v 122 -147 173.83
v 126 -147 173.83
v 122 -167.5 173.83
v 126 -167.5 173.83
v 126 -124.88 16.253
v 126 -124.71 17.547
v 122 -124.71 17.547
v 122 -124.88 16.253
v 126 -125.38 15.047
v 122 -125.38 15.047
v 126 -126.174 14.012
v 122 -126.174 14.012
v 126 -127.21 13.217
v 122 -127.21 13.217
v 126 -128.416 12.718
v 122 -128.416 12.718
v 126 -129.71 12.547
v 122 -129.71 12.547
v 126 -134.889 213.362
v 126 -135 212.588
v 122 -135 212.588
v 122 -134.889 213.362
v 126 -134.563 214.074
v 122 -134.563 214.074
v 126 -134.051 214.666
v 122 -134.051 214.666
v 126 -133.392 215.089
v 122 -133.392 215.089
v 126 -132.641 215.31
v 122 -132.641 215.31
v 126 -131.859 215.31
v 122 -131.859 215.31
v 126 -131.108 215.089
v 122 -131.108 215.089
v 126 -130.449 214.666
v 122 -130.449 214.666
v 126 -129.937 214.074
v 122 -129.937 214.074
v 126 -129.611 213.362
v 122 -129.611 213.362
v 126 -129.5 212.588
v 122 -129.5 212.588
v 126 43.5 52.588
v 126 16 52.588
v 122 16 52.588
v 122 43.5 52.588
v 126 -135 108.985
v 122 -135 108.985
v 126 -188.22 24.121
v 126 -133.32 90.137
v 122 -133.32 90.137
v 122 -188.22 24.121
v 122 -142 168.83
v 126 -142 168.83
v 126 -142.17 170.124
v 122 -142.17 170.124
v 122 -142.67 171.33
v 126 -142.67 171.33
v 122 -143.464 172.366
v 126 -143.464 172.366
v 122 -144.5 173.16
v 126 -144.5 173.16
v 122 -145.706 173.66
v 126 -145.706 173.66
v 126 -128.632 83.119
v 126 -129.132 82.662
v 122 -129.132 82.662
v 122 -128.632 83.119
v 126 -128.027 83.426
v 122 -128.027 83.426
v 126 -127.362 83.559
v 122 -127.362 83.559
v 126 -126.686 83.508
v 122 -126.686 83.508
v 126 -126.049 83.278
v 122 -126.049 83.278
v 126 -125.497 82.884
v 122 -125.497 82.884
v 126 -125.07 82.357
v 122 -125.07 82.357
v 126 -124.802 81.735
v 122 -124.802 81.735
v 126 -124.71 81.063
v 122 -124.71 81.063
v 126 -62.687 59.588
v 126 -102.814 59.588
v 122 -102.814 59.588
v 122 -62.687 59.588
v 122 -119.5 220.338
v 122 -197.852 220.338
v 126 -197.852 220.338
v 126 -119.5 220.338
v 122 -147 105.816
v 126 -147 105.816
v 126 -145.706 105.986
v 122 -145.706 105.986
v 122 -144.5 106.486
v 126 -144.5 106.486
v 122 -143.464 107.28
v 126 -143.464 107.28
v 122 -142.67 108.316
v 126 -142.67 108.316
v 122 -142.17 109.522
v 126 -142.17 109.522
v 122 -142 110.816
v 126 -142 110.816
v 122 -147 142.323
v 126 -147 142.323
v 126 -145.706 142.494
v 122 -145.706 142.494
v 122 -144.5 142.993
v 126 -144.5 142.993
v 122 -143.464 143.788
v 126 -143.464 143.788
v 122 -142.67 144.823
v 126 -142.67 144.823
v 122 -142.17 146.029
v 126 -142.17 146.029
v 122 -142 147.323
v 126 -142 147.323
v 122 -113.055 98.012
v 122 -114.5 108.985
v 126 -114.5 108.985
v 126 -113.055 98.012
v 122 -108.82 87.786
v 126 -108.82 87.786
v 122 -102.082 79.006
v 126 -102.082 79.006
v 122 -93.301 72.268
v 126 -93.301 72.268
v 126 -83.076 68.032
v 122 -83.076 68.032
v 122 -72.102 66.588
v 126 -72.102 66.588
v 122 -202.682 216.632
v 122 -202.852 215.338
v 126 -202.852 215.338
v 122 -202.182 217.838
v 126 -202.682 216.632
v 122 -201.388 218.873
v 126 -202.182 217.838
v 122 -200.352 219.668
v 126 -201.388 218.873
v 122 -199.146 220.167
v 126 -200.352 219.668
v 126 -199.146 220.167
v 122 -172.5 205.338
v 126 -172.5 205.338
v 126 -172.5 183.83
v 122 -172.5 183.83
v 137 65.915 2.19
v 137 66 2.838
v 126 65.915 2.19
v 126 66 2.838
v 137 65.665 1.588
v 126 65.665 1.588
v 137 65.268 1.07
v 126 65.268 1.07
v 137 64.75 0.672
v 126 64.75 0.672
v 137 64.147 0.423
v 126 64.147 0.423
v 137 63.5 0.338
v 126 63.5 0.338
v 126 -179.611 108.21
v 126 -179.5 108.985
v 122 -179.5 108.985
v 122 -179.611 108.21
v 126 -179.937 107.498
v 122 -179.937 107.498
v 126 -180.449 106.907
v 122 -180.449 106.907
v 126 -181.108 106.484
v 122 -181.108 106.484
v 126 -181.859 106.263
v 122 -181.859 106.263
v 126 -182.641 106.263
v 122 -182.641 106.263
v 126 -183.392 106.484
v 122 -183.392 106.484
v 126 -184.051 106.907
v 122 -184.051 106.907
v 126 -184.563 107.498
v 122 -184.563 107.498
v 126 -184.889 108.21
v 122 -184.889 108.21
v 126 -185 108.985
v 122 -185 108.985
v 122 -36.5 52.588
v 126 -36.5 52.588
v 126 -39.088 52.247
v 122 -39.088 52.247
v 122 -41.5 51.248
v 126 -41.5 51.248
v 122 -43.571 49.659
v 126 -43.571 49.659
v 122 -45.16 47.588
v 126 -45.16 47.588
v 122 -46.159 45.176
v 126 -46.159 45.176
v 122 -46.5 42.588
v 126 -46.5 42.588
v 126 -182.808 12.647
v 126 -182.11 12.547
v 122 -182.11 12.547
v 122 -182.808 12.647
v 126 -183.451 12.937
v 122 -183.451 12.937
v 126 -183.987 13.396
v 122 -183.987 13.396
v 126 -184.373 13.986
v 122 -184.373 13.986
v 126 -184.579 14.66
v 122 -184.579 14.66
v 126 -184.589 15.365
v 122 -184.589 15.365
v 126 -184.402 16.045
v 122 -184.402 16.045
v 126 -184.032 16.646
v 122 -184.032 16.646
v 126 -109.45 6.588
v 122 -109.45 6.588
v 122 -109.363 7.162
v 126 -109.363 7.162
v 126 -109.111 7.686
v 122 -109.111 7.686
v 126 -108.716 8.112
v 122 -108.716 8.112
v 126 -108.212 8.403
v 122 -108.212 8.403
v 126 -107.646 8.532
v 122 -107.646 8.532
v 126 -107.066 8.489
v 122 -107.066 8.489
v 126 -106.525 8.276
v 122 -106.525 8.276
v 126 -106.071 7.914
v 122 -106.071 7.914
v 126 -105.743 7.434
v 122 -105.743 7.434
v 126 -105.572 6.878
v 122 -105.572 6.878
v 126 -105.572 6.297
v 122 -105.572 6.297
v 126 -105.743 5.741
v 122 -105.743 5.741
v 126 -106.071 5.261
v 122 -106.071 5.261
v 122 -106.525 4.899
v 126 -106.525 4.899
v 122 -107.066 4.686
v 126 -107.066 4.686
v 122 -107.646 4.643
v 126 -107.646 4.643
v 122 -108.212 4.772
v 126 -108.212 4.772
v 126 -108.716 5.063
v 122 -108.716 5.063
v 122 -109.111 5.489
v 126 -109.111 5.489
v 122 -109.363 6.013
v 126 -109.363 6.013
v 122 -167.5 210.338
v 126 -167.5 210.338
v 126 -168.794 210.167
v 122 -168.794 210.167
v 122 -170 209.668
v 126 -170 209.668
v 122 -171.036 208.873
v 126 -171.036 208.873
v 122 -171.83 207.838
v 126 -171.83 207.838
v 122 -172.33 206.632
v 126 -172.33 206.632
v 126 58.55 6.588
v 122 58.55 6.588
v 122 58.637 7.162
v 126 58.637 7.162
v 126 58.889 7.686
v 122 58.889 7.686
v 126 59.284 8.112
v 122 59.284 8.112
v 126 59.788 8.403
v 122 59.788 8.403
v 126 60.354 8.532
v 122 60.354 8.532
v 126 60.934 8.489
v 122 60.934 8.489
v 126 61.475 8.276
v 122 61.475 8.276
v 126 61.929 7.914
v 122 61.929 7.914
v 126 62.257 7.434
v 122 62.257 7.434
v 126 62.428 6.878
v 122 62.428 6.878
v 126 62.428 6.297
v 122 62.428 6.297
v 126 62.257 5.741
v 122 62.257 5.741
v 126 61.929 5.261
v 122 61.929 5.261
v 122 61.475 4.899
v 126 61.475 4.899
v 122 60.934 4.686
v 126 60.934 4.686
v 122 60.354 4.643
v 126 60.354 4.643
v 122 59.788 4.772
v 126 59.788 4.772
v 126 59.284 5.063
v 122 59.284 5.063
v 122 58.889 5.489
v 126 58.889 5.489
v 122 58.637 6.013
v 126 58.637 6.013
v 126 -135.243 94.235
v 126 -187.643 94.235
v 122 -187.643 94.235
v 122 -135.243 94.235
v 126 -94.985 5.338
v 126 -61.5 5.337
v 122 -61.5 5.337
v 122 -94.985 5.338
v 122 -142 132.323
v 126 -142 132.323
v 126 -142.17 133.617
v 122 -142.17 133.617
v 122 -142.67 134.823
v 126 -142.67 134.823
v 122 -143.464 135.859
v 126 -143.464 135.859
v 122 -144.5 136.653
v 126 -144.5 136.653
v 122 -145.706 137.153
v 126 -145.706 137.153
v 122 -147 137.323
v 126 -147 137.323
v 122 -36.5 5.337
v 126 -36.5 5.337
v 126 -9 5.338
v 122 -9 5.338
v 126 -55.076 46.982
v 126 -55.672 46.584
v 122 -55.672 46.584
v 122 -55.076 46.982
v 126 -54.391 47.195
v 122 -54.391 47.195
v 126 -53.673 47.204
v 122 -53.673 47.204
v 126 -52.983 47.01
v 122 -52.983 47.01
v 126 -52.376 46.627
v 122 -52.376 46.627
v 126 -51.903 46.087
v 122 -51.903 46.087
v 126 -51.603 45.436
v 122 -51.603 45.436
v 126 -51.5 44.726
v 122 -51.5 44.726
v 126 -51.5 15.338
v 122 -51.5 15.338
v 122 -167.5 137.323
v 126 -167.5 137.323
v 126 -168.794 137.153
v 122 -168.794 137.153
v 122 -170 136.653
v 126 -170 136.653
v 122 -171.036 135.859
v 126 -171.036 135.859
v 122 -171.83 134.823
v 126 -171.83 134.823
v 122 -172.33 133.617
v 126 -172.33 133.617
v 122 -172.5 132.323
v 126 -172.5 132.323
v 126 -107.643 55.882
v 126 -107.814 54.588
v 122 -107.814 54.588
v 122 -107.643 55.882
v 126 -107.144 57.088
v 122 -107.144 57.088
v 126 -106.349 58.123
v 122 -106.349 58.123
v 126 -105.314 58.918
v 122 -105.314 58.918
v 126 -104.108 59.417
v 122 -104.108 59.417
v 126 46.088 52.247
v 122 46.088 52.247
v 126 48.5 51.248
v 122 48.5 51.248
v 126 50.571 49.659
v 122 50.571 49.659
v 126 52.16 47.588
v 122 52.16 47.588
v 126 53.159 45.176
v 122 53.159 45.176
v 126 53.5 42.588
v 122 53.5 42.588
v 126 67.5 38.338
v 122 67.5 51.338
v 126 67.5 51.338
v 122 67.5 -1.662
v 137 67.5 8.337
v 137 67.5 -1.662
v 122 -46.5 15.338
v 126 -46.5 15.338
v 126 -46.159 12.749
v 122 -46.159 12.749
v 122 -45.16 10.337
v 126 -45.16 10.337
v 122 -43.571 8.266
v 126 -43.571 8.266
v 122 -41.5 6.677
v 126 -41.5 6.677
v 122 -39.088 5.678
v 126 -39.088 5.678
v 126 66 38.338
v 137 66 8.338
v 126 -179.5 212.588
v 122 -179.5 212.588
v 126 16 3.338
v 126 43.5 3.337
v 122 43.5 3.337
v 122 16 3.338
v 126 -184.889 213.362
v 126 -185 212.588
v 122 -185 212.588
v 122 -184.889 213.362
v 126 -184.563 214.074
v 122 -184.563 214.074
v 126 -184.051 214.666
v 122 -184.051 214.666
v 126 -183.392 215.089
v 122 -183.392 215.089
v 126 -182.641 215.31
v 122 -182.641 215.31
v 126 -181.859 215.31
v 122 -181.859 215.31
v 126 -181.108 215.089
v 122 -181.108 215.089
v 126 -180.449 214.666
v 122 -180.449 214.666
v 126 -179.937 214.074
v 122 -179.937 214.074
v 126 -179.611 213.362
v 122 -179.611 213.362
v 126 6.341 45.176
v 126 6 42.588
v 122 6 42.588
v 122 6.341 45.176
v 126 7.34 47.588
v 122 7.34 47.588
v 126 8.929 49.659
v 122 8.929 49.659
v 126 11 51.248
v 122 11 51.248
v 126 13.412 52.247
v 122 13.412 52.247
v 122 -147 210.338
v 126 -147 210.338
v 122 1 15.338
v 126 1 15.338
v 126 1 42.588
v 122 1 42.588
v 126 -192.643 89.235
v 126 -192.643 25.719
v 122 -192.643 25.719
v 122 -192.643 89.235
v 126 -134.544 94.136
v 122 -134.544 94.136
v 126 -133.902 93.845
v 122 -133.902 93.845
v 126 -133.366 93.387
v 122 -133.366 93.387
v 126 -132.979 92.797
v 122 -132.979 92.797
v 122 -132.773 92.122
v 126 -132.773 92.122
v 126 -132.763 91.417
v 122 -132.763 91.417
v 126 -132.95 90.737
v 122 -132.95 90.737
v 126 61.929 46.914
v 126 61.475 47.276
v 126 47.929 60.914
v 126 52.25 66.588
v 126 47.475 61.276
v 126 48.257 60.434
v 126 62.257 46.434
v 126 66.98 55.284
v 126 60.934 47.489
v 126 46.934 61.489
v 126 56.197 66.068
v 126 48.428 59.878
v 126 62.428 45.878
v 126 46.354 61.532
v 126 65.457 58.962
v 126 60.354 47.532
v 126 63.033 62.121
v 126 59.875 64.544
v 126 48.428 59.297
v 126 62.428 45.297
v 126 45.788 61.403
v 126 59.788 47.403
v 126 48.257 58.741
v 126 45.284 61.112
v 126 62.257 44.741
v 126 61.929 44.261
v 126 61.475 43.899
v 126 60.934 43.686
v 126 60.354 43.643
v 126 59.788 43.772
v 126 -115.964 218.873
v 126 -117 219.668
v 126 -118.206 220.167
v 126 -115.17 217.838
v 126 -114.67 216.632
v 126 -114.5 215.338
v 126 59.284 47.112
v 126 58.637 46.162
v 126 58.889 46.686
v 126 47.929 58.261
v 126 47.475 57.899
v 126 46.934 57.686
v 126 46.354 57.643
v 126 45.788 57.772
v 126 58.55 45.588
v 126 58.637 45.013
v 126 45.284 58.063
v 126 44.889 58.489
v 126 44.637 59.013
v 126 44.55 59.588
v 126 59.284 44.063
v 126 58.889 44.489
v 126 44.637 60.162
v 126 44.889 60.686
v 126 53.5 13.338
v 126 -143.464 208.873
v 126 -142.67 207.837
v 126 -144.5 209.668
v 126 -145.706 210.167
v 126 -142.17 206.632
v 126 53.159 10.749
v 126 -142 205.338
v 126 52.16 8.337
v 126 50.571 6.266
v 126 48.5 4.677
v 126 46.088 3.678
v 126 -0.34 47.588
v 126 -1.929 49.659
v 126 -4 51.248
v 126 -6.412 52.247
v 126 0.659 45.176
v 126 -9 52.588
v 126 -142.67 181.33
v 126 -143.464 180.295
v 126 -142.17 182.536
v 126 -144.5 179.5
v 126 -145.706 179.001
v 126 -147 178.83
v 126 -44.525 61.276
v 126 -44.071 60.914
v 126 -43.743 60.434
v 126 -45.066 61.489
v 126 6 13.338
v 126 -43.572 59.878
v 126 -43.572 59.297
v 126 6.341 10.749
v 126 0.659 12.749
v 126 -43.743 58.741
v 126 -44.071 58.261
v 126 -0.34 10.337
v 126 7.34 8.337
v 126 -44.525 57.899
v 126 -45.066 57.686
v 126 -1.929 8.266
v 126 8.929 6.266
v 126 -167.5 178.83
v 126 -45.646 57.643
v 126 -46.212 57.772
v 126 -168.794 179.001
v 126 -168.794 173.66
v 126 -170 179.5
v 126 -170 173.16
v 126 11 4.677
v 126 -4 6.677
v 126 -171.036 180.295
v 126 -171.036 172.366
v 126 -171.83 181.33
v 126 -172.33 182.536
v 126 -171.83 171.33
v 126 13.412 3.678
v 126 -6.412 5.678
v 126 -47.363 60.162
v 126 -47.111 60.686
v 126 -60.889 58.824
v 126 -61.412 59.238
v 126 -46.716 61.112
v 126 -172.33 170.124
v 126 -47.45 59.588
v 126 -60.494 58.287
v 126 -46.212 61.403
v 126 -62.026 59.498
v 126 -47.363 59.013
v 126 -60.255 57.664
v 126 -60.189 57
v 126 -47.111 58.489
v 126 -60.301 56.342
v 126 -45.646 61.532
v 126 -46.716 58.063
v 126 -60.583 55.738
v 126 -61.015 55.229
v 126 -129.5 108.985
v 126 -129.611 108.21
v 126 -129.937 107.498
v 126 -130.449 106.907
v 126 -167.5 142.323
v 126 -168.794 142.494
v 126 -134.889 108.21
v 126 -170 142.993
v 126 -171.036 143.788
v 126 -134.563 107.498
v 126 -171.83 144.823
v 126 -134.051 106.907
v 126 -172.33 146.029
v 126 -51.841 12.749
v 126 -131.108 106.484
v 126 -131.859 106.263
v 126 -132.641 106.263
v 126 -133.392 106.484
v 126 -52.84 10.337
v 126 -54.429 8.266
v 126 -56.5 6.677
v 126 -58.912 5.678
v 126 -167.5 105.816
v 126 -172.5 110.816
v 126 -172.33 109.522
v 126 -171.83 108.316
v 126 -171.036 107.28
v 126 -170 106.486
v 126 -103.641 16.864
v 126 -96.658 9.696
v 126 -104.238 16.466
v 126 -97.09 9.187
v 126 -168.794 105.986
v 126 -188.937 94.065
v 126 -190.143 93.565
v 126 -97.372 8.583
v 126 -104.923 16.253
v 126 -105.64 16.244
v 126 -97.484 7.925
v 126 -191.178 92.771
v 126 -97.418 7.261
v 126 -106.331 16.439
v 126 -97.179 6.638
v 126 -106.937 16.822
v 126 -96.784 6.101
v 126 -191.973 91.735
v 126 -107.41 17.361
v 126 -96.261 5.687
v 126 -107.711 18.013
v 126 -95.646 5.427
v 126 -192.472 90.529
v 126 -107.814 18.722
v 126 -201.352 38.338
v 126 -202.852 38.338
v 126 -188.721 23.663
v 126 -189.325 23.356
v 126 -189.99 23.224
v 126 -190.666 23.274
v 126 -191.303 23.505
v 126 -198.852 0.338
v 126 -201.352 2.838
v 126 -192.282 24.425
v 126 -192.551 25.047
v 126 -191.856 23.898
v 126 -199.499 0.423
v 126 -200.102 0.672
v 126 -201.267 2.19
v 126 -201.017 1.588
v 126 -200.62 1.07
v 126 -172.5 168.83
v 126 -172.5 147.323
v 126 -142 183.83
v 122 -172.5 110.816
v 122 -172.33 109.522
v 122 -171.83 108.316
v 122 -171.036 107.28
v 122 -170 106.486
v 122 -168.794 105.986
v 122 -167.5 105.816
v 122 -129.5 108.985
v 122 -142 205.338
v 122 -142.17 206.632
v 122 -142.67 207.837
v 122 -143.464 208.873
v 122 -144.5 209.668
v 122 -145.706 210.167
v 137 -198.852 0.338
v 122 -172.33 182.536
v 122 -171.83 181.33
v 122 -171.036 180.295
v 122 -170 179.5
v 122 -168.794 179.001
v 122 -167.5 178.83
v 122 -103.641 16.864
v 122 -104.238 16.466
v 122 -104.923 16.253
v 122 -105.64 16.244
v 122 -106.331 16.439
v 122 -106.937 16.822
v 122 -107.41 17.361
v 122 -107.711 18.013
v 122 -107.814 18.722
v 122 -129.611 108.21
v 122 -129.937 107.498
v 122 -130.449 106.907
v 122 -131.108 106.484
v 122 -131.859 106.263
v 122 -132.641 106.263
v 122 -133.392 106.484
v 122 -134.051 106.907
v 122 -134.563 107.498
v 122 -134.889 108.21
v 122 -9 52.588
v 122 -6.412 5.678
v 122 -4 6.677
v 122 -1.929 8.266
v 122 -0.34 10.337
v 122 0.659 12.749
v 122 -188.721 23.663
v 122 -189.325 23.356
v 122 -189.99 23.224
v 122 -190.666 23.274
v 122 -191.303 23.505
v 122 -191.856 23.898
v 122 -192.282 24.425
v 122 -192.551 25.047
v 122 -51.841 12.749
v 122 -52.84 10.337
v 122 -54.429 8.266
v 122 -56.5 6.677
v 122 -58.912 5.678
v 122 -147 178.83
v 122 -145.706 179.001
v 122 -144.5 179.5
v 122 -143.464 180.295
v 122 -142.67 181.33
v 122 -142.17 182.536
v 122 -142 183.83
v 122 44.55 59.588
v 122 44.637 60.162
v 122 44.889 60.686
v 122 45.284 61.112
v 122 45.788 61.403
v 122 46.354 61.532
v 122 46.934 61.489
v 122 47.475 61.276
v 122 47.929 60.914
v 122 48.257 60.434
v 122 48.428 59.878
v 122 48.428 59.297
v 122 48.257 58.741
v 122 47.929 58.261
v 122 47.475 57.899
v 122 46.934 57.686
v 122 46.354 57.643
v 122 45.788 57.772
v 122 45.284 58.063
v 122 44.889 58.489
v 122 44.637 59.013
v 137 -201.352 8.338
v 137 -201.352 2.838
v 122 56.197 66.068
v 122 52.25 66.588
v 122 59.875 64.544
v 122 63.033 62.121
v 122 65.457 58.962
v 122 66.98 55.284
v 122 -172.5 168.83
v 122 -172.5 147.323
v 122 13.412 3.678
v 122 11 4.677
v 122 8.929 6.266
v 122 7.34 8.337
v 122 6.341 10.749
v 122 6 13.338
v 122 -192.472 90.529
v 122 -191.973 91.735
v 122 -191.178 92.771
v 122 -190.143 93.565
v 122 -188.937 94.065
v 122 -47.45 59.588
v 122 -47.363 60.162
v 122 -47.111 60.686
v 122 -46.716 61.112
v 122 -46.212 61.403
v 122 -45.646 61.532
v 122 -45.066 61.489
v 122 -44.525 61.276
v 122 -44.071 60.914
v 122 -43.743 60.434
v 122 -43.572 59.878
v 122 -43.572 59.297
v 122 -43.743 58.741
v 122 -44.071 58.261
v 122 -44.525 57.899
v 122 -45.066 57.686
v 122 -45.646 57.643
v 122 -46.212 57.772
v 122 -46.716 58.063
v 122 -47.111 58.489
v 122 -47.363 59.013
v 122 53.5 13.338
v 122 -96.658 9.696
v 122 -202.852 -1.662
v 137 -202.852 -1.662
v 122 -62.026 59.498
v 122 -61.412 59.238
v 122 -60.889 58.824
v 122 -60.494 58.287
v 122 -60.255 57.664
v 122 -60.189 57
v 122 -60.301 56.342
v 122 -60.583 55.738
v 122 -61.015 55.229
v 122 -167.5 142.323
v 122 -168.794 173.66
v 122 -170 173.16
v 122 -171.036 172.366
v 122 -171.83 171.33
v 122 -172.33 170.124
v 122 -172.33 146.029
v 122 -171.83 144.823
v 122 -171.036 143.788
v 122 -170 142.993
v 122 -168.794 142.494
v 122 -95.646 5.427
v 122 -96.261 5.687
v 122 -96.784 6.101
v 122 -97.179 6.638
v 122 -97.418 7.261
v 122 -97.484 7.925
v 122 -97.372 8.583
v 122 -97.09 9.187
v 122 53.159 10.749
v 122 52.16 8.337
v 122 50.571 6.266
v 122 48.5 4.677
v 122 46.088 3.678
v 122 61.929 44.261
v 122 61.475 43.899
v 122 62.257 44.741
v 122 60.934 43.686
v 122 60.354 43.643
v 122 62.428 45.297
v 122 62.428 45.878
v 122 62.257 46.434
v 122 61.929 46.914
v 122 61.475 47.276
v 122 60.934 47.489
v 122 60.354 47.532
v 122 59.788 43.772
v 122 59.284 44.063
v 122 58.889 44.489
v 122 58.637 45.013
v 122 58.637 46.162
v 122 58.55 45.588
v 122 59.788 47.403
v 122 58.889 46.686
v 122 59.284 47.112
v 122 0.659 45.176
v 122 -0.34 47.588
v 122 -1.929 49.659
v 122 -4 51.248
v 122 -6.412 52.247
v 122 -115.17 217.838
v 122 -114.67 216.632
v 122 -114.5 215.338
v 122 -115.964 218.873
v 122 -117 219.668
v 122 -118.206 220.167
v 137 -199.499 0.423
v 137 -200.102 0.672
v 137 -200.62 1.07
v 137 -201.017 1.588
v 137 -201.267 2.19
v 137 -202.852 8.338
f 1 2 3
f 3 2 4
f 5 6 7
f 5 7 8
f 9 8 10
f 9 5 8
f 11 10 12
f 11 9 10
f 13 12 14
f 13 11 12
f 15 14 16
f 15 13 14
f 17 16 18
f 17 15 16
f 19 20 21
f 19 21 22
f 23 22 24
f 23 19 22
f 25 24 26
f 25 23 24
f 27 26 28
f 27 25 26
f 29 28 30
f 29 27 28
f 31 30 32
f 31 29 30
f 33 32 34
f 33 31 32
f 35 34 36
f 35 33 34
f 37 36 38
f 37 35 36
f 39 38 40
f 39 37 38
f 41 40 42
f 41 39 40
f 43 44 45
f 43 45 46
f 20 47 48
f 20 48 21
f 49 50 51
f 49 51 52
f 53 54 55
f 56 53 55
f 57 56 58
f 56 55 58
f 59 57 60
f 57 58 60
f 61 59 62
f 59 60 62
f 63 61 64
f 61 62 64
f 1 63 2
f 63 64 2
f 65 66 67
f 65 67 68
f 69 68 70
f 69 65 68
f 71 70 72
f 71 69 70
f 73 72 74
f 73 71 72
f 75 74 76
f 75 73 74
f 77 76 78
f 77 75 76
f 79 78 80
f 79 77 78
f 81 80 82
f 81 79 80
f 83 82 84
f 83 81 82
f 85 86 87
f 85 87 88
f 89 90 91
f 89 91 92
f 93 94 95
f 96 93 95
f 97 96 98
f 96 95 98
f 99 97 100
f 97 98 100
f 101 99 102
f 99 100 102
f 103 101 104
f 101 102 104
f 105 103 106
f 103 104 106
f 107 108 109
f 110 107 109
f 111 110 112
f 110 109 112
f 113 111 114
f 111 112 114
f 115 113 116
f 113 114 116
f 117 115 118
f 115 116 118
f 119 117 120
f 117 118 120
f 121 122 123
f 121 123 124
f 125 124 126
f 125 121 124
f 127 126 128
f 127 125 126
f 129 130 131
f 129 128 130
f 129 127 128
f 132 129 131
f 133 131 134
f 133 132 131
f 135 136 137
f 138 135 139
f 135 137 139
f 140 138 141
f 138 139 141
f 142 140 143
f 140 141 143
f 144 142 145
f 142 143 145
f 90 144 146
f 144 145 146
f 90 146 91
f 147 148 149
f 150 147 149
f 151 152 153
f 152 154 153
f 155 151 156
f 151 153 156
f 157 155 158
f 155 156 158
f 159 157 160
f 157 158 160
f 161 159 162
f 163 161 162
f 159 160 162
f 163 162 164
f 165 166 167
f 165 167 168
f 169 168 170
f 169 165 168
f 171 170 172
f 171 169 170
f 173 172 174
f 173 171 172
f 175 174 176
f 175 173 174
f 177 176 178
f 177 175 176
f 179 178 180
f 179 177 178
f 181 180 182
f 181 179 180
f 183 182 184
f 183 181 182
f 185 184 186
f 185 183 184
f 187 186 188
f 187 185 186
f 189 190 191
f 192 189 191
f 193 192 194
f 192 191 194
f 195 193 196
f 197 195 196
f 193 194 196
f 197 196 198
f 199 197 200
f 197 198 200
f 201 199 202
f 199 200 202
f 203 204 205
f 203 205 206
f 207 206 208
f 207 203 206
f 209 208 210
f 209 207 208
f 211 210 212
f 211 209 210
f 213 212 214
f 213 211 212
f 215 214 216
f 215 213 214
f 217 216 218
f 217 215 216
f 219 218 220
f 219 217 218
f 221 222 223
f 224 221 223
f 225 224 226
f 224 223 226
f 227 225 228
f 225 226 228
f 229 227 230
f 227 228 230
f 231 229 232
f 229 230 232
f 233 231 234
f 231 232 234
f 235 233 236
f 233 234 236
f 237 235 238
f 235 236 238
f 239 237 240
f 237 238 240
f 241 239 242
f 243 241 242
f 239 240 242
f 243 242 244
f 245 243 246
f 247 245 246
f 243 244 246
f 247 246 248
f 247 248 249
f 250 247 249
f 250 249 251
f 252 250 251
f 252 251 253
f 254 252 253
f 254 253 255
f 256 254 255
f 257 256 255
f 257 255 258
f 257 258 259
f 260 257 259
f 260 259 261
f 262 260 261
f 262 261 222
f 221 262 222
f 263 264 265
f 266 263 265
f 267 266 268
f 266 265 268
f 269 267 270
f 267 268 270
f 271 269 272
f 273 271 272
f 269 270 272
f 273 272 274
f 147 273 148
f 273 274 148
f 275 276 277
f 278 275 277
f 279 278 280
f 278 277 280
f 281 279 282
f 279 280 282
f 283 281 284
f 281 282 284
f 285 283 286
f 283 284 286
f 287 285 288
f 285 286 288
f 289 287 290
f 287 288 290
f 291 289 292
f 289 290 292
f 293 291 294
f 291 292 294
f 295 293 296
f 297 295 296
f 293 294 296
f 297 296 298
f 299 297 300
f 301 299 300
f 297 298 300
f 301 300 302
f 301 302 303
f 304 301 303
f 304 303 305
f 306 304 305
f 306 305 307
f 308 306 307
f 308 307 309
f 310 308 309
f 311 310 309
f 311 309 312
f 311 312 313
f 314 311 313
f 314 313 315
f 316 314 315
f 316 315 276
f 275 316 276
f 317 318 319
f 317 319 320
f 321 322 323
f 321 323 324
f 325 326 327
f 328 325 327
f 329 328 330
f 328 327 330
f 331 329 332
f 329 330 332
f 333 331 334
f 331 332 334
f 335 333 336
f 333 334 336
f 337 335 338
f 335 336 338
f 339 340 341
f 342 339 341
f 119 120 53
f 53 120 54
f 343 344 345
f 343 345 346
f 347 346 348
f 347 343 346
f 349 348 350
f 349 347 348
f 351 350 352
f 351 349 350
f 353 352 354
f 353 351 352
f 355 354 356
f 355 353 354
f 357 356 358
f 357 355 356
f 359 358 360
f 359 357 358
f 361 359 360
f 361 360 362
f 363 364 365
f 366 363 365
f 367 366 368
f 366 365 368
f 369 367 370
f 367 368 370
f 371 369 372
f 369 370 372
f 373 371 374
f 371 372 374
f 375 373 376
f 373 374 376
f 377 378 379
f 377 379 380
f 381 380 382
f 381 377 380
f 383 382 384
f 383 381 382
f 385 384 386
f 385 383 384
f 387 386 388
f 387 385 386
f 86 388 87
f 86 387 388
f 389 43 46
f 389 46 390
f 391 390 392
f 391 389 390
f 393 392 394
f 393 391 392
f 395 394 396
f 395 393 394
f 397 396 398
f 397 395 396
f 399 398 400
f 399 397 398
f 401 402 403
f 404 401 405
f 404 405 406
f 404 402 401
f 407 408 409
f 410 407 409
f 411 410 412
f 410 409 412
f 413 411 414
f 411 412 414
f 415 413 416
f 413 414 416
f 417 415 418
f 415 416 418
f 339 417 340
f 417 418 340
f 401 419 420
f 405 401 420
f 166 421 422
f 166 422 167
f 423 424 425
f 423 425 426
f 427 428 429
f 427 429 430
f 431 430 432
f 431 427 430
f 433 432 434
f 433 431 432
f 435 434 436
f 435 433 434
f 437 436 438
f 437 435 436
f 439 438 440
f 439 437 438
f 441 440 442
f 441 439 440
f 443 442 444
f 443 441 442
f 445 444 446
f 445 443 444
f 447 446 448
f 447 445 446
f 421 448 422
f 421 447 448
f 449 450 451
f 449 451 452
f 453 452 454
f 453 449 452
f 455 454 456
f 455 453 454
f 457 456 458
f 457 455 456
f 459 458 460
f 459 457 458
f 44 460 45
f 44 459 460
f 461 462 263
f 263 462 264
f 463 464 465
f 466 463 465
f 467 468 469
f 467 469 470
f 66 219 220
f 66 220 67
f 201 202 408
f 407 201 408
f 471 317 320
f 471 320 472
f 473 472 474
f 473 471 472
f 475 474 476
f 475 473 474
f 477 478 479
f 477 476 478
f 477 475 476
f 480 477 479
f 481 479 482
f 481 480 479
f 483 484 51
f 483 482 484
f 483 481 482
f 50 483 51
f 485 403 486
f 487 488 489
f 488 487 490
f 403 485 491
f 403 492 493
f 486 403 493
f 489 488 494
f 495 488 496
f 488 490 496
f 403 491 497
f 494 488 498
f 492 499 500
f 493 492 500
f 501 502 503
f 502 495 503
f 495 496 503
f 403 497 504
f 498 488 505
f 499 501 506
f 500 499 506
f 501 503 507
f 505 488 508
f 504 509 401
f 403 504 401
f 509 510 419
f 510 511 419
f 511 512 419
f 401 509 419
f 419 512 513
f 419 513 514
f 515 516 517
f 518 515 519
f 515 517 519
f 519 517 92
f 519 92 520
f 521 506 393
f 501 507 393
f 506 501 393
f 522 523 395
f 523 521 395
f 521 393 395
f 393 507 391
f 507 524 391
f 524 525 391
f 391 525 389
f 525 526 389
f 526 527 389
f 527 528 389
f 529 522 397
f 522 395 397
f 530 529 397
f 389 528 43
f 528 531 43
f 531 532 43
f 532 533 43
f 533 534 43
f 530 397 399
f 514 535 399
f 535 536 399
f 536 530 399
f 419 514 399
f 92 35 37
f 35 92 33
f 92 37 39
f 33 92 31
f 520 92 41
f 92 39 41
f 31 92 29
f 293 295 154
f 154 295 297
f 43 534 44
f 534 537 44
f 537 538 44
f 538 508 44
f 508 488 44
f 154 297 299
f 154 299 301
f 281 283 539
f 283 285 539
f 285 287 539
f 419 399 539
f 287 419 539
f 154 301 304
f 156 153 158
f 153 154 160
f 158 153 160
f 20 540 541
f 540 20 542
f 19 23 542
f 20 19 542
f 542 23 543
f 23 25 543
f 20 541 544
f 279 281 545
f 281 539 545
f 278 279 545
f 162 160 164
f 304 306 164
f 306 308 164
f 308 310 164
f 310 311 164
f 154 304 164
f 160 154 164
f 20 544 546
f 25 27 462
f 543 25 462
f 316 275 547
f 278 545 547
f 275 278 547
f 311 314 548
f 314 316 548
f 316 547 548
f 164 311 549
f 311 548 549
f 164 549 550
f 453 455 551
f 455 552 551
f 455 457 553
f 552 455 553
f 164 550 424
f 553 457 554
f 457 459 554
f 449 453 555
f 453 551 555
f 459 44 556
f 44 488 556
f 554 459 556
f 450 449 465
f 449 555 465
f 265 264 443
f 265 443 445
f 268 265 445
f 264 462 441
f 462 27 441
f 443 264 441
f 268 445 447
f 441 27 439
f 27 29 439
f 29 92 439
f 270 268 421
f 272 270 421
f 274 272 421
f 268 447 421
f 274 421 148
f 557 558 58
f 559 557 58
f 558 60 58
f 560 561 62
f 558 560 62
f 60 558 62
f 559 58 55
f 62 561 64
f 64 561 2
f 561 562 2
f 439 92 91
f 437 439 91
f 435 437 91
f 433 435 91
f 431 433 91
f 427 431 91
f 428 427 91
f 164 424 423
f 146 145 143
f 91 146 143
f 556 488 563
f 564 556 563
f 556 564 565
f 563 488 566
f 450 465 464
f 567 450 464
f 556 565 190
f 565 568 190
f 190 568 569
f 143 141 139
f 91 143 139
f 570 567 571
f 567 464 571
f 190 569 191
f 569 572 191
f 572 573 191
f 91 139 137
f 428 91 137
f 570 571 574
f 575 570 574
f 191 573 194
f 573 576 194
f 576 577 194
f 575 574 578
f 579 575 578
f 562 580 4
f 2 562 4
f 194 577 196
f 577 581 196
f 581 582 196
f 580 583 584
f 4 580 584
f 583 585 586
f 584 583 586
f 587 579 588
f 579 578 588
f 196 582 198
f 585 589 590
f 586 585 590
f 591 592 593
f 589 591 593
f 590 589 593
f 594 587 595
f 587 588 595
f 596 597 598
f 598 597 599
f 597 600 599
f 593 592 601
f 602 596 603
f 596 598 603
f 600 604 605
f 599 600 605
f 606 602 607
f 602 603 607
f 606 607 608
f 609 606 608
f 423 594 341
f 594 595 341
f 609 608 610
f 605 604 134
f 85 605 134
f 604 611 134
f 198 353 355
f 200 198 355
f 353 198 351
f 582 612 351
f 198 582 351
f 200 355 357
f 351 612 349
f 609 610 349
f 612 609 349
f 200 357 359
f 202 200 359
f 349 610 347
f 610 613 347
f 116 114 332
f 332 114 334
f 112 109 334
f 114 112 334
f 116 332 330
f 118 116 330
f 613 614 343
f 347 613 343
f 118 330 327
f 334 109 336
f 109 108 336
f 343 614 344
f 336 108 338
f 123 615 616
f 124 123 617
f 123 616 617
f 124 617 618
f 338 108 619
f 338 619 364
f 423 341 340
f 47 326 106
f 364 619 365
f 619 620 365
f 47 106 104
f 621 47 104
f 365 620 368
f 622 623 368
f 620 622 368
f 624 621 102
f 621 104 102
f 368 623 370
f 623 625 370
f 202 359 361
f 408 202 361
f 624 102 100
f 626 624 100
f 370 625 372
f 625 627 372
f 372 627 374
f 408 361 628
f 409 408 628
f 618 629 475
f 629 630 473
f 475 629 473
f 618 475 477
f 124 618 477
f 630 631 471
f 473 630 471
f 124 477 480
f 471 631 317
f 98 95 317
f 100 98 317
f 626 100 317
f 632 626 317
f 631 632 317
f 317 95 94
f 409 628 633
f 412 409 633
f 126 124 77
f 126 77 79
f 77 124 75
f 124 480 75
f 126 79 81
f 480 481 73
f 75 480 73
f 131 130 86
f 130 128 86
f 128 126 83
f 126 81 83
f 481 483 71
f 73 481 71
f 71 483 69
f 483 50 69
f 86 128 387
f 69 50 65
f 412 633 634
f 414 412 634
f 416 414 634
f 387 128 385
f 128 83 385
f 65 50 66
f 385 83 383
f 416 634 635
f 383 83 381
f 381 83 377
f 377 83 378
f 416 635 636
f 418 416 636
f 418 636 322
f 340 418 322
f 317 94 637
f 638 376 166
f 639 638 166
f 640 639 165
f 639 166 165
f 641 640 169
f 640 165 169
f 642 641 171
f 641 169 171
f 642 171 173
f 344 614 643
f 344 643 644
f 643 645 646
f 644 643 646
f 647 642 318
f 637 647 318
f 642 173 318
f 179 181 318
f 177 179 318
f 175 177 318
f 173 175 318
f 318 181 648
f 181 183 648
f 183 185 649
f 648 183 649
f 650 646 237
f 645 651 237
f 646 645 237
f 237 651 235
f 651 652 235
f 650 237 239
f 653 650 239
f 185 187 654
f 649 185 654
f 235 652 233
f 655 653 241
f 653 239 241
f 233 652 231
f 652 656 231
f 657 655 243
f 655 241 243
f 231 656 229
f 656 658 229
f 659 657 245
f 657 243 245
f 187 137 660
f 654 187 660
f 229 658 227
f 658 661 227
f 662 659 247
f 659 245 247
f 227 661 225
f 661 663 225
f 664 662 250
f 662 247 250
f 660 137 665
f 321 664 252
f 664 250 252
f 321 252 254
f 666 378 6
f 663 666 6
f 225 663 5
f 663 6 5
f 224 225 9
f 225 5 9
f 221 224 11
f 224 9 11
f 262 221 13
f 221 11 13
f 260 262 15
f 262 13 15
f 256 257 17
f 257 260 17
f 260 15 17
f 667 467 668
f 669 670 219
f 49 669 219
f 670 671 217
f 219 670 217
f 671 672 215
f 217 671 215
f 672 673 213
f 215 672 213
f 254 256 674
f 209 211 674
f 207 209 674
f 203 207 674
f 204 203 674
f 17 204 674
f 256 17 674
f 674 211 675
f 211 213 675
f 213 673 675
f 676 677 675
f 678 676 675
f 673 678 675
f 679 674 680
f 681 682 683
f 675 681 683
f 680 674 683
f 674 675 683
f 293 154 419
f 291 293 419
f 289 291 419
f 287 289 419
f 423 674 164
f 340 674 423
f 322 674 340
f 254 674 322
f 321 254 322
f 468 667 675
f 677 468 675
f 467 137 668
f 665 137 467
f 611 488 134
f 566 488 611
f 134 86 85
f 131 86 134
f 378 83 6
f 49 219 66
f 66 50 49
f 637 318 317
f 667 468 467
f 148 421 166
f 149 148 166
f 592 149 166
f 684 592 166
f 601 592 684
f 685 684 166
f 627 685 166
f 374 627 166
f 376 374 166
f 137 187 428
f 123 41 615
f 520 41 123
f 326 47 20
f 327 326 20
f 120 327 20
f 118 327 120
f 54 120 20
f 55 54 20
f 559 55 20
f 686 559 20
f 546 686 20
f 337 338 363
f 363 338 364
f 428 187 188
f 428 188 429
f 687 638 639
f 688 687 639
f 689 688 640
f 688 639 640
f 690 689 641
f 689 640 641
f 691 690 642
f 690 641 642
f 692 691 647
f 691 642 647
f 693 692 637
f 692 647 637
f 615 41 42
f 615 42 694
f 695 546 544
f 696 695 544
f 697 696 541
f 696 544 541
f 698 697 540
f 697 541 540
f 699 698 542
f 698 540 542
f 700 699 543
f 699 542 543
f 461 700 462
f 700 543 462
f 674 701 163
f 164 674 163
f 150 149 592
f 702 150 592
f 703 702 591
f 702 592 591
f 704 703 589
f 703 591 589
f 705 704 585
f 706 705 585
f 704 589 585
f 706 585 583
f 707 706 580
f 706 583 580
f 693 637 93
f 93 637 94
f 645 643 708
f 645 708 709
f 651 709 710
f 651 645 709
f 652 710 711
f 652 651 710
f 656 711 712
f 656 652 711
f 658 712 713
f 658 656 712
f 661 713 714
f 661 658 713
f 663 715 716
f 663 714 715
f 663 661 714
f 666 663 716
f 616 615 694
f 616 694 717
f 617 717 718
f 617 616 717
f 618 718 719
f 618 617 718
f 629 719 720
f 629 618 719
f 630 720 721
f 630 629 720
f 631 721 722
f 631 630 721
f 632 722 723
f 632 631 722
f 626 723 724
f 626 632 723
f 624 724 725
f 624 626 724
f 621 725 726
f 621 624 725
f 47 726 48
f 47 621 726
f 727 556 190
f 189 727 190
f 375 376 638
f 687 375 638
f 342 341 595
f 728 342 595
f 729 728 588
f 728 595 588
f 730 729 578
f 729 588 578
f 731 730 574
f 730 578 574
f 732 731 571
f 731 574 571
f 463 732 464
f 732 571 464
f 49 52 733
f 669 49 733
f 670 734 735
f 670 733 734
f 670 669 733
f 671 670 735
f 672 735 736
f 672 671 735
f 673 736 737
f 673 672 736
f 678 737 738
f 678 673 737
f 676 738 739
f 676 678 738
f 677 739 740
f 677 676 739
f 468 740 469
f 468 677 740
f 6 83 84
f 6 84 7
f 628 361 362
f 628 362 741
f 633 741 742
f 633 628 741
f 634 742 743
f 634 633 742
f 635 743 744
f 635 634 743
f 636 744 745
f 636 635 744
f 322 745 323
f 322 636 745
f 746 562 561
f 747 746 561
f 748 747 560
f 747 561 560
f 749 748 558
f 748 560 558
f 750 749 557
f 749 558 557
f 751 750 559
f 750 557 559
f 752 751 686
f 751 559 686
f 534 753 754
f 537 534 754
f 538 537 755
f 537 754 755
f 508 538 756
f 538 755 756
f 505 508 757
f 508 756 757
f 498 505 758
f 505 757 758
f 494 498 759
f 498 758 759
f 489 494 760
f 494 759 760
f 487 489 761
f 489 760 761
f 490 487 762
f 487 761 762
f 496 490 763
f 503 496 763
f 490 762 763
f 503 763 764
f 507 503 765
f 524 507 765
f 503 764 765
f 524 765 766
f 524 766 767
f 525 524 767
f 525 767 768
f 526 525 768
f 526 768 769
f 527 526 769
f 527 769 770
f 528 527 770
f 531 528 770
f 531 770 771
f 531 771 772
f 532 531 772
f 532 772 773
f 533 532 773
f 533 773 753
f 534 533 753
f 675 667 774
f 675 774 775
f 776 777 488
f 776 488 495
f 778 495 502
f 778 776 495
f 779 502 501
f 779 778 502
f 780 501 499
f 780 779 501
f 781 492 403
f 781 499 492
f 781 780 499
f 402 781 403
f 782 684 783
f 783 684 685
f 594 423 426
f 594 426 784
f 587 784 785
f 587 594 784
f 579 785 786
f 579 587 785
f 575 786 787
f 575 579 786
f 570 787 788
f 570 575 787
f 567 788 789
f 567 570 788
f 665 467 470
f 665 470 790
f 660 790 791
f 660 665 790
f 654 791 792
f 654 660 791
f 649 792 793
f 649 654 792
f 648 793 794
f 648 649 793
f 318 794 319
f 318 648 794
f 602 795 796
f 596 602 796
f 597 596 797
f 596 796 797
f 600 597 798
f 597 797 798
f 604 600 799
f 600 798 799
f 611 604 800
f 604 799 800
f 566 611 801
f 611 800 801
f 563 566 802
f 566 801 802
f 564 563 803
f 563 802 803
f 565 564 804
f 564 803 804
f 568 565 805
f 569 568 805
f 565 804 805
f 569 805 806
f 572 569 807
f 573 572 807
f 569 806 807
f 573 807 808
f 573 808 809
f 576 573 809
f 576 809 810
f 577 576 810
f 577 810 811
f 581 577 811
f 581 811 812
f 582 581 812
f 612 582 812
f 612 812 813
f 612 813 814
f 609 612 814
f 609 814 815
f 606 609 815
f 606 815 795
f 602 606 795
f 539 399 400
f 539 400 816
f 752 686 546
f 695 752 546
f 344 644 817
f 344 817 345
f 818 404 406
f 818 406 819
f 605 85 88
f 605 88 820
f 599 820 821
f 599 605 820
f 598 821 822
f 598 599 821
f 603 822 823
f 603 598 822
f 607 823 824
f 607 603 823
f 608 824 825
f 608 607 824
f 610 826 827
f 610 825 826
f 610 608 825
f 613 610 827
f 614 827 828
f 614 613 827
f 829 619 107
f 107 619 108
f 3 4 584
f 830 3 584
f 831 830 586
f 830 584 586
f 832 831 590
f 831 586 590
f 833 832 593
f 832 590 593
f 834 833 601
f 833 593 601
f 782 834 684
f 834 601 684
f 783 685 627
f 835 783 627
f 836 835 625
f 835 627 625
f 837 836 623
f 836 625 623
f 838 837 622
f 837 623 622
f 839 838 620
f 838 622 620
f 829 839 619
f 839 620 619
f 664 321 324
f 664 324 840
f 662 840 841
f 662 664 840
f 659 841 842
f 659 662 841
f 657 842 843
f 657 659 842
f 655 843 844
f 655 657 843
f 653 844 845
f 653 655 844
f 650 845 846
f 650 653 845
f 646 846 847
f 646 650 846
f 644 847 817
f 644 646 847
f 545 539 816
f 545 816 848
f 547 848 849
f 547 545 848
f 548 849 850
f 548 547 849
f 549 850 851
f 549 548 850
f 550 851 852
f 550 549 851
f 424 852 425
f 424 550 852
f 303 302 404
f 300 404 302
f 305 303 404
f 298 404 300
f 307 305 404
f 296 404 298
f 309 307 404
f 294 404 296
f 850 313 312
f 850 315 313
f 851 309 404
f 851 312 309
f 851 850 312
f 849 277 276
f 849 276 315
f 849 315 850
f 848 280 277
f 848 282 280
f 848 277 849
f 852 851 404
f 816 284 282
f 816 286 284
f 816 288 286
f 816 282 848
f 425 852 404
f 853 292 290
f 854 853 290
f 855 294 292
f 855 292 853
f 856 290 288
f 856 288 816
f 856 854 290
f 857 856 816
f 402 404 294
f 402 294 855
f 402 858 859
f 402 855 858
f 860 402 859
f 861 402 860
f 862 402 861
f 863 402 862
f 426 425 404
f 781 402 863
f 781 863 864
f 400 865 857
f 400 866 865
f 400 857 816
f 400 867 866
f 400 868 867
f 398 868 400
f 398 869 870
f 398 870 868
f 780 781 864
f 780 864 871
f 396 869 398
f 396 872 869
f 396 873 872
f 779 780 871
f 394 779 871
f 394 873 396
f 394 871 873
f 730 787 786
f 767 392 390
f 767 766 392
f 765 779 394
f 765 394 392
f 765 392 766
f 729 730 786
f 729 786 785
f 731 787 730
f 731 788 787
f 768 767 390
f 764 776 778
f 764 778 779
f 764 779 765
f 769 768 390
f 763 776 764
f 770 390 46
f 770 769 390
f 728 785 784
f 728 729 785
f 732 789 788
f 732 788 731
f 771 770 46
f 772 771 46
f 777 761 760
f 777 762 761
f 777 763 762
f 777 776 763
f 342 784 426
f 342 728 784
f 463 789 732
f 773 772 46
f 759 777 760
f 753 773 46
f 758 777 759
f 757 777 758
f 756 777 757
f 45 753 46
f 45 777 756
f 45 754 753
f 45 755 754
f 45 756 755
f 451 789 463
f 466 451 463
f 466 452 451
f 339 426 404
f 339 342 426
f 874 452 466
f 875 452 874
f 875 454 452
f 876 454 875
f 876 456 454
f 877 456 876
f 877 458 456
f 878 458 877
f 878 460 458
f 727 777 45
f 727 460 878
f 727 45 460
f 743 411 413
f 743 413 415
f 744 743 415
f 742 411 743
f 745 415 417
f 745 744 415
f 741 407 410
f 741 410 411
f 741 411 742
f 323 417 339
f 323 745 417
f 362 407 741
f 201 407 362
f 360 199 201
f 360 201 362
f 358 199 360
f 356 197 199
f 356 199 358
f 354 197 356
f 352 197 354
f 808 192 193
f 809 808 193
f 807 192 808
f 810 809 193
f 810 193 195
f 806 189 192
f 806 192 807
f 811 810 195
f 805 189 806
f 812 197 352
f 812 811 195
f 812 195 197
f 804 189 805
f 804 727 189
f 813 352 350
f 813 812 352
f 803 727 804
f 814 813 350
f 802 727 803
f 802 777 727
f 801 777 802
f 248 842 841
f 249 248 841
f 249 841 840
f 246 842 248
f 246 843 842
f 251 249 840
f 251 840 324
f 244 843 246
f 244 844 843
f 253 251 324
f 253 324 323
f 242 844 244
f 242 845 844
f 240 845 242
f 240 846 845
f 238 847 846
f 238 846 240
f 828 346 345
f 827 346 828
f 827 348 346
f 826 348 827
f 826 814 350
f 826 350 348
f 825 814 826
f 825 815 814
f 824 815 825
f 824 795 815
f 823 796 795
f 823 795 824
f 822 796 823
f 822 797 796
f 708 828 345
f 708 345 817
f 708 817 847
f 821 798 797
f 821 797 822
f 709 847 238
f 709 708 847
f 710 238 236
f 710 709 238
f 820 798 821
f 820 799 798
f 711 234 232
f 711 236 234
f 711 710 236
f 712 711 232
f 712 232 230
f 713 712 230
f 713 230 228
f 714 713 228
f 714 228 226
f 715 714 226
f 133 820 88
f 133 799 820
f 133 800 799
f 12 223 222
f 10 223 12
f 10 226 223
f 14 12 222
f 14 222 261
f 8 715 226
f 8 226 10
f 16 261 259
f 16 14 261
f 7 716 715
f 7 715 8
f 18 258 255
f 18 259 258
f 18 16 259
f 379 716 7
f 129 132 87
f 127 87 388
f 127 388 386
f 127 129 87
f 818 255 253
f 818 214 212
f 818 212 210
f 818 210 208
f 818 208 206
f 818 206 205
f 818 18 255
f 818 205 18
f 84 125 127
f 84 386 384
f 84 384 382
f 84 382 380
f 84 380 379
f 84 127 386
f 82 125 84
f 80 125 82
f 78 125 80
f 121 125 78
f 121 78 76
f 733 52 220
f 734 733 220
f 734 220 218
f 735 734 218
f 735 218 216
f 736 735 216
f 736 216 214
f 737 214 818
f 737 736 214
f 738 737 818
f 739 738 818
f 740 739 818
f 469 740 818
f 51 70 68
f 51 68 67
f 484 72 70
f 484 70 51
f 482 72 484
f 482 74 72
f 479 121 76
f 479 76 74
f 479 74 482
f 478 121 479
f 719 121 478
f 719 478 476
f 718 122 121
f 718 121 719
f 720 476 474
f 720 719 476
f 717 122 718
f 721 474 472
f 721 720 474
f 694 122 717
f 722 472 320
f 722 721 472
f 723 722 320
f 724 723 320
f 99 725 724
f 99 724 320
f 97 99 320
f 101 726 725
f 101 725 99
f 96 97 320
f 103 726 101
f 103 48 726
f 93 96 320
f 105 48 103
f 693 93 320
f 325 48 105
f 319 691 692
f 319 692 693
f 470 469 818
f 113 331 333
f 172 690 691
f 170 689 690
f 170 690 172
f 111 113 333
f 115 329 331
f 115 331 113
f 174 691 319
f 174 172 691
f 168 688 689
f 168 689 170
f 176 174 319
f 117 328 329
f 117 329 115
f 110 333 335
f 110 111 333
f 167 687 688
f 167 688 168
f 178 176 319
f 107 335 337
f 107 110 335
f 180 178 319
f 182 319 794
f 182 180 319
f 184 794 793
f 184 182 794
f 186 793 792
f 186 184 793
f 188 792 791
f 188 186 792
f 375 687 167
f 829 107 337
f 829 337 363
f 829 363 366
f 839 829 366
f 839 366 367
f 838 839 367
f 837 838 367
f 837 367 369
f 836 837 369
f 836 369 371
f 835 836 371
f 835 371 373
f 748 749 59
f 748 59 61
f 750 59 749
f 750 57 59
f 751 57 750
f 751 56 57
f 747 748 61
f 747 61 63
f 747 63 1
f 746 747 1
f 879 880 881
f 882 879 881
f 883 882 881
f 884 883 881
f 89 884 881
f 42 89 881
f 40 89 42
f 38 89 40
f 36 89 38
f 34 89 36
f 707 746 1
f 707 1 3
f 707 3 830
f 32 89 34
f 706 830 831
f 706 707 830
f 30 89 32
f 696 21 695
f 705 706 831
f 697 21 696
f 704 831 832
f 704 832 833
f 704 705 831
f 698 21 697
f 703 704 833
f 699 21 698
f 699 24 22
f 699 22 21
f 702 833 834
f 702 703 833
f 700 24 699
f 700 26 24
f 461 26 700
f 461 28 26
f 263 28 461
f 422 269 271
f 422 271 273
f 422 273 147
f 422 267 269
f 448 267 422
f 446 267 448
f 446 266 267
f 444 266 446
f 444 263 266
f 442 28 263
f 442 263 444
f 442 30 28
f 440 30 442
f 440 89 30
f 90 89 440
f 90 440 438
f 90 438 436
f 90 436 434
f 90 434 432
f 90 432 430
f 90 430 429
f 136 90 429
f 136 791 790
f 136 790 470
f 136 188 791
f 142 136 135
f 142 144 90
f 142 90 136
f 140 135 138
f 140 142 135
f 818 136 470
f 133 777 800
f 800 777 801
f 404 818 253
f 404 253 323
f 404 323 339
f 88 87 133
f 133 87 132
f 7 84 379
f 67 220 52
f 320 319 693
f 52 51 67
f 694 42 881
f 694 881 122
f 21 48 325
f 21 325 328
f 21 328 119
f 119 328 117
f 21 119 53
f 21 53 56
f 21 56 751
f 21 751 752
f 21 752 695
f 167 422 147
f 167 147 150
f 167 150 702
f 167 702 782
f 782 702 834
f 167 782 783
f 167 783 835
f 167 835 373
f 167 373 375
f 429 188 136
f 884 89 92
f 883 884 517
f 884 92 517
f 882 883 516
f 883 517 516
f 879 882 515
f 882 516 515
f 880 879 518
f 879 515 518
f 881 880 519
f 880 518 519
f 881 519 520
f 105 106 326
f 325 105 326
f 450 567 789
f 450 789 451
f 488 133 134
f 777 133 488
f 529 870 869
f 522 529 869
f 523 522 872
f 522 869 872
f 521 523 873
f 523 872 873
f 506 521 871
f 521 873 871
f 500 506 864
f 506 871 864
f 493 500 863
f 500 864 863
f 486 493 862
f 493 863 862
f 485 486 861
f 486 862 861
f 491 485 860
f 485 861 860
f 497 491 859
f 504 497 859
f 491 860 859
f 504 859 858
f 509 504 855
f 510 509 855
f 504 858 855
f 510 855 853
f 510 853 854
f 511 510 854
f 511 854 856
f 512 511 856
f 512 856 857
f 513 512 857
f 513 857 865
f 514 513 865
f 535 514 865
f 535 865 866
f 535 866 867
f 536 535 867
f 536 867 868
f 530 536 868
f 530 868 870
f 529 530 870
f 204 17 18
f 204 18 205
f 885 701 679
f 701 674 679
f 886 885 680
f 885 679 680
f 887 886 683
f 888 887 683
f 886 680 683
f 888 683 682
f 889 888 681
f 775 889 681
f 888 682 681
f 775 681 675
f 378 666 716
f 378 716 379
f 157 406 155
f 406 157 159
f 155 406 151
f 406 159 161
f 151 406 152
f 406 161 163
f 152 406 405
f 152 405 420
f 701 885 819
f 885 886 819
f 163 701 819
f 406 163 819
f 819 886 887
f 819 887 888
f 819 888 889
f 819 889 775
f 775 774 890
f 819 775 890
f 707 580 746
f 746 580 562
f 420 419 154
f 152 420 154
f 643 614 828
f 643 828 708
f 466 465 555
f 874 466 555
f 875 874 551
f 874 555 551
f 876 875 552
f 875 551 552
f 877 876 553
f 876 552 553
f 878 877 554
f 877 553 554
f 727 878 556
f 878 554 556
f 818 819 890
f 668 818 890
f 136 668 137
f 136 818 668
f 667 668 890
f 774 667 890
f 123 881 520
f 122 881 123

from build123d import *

# Parameters (mm, degrees)
SKETCH1_R           = 1.95
BOSS_EXTRUDE1_DEPTH = 15
CUT_EXTRUDE2_DEPTH  = 16
CUT_EXTRUDE3_DEPTH  = 16
CUT_EXTRUDE4_DEPTH  = 16
CUT_EXTRUDE5_DEPTH  = 16
FILLET1_R           = 5
SKETCH7_W           = 220
SKETCH7_H           = 267.35226683
CUT_EXTRUDE6_DEPTH  = 11
CUT_EXTRUDE7_DEPTH  = 271.35226683
FILLET2_R           = 2.5


with BuildPart() as part:
    # Sketch1 → Boss-Extrude1 (new body)
    with BuildSketch(Plane(origin=(122, 0, 0), x_dir=(0, -1, 0), z_dir=(-1, 0, 0))):
        with BuildLine():
            Line((-67.5, -1.6625), (202.85226683, -1.6625))
            Line((202.85226683, -1.6625), (202.85226683, 220.3375))
            Line((202.85226683, 220.3375), (114.499999998, 220.3375))
            Line((114.499999998, 220.3375), (114.499999998, 108.985233168))
            ThreePointArc((114.499999998, 108.985233168), (102.08199146, 79.005508538), (72.10226683, 66.5875))
            Line((72.10226683, 66.5875), (-52.25, 66.5875))
            ThreePointArc((-52.25, 66.5875), (-63.033378413, 62.120878413), (-67.5, 51.3375))
            Line((-67.5, 51.3375), (-67.5, -1.6625))
        make_face()
        with Locations((-60.5, 6.5875)):
            Circle(SKETCH1_R, mode=Mode.SUBTRACT)
        with Locations((107.5, 6.5875)):
            Circle(SKETCH1_R, mode=Mode.SUBTRACT)
        with Locations((-60.5, 45.5875)):
            Circle(SKETCH1_R, mode=Mode.SUBTRACT)
        with Locations((-46.5, 59.5875)):
            Circle(SKETCH1_R, mode=Mode.SUBTRACT)
        with Locations((45.5, 59.5875)):
            Circle(SKETCH1_R, mode=Mode.SUBTRACT)
        Polygon((42.95, 15.7375), (42.95, 13.2375), (40.95, 11.3375), (33.95, 11.3375), (31.95, 13.2375), (31.95, 15.7375), align=None, mode=Mode.SUBTRACT)
        with BuildLine():
            Line((30.95, 11.3375), (17.5, 11.3375))
            Line((17.5, 11.3375), (17.5, 13.9375))
            ThreePointArc((17.5, 13.9375), (24.225, 16.3375), (30.95, 13.9375))
            Line((30.95, 13.9375), (30.95, 11.3375))
        make_face(mode=Mode.SUBTRACT)
    extrude(amount=-BOSS_EXTRUDE1_DEPTH)

    # Sketch2 → Cut-Extrude2 (cut, through all)
    with BuildSketch(Plane(origin=(137, 0, 0), x_dir=(0, 0, -1), z_dir=(1, 0, 0))):
        with BuildLine():
            Line((-42.5875, 53.5), (-13.3375, 53.5))
            ThreePointArc((-13.3375, 53.5), (-6.266432188, 50.571067812), (-3.3375, 43.5))
            Line((-3.3375, 43.5), (-3.3375, 16))
            ThreePointArc((-3.3375, 16), (-6.266432188, 8.928932188), (-13.3375, 6))
            Line((-13.3375, 6), (-42.5875, 6))
            ThreePointArc((-42.5875, 6), (-49.658567812, 8.928932188), (-52.5875, 16))
            Line((-52.5875, 16), (-52.5875, 43.5))
            ThreePointArc((-52.5875, 43.5), (-49.658567812, 50.571067812), (-42.5875, 53.5))
        make_face()
        with BuildLine():
            Line((-42.5875, -46.5), (-15.3375, -46.5))
            ThreePointArc((-15.3375, -46.5), (-8.266432188, -43.571067812), (-5.3375, -36.5))
            Line((-5.3375, -36.5), (-5.3375, -9))
            ThreePointArc((-5.3375, -9), (-8.266432188, -1.928932188), (-15.3375, 1))
            Line((-15.3375, 1), (-42.5875, 1))
            ThreePointArc((-42.5875, 1), (-49.658567812, -1.928932188), (-52.5875, -9))
            Line((-52.5875, -9), (-52.5875, -36.5))
            ThreePointArc((-52.5875, -36.5), (-49.658567812, -43.571067812), (-42.5875, -46.5))
        make_face()
        with BuildLine():
            Line((-55.22929809, -61.015037849), (-16.864289826, -103.641109909))
            ThreePointArc((-16.864289826, -103.641109909), (-16.438731405, -106.33063253), (-18.722491736, -107.81355891))
            Line((-18.722491736, -107.81355891), (-54.5875, -107.81355891))
            ThreePointArc((-54.5875, -107.81355891), (-58.123033906, -106.349092816), (-59.5875, -102.81355891))
            Line((-59.5875, -102.81355891), (-59.5875, -62.68748685))
            ThreePointArc((-59.5875, -62.68748685), (-57.983182763, -60.353444779), (-55.22929809, -61.015037849))
        make_face()
        with BuildLine():
            Line((-44.725753318, -51.5), (-15.3375, -51.5))
            ThreePointArc((-15.3375, -51.5), (-8.266432188, -54.428932188), (-5.3375, -61.5))
            Line((-5.3375, -61.5), (-5.3375, -94.985299242))
            ThreePointArc((-5.3375, -94.985299242), (-6.941817237, -97.319341313), (-9.69570191, -96.657748243))
            Line((-9.69570191, -96.657748243), (-46.583955228, -55.672449001))
            ThreePointArc((-46.583955228, -55.672449001), (-47.00951365, -52.98292638), (-44.725753318, -51.5))
        make_face()
    extrude(amount=-CUT_EXTRUDE2_DEPTH, mode=Mode.SUBTRACT)

    # Sketch3 → Cut-Extrude3 (cut, through all)
    with BuildSketch(Plane(origin=(137, 0, 0), x_dir=(0, 0, -1), z_dir=(1, 0, 0))):
        with BuildLine():
            Line((-212.5875, -129.499999998), (-108.985233168, -129.499999998))
            ThreePointArc((-108.985233168, -129.499999998), (-106.235233168, -132.249999998), (-108.985233168, -134.999999998))
            Line((-108.985233168, -134.999999998), (-212.5875, -134.999999998))
            ThreePointArc((-212.5875, -134.999999998), (-215.3375, -132.249999998), (-212.5875, -129.499999998))
        make_face()
        with BuildLine():
            Line((-212.5875, -179.499999998), (-108.985233168, -179.499999998))
            ThreePointArc((-108.985233168, -179.499999998), (-106.235233168, -182.249999998), (-108.985233168, -184.999999998))
            Line((-108.985233168, -184.999999998), (-212.5875, -184.999999998))
            ThreePointArc((-212.5875, -184.999999998), (-215.3375, -182.249999998), (-212.5875, -179.499999998))
        make_face()
    extrude(amount=-CUT_EXTRUDE3_DEPTH, mode=Mode.SUBTRACT)

    # Sketch4 → Cut-Extrude4 (cut, through all)
    with BuildSketch(Plane(origin=(137, 0, 0), x_dir=(0, 0, -1), z_dir=(1, 0, 0))):
        with BuildLine():
            Line((-94.235233168, -187.642635713), (-94.235233168, -135.242622679))
            ThreePointArc((-94.235233168, -135.242622679), (-92.796770819, -132.97918772), (-90.136722915, -133.320445536))
            Line((-90.136722915, -133.320445536), (-24.120536911, -188.22045857))
            ThreePointArc((-24.120536911, -188.22045857), (-23.367936485, -190.992505451), (-25.719047164, -192.642635713))
            Line((-25.719047164, -192.642635713), (-89.235233168, -192.642635713))
            ThreePointArc((-89.235233168, -192.642635713), (-92.770767074, -191.178169619), (-94.235233168, -187.642635713))
        make_face()
        with BuildLine():
            Line((-12.547131117, -129.709631116), (-12.547131117, -182.109644149))
            ThreePointArc((-12.547131117, -182.109644149), (-13.985593467, -184.373079109), (-16.64564137, -184.031821292))
            Line((-16.64564137, -184.031821292), (-82.661827375, -129.131808259))
            ThreePointArc((-82.661827375, -129.131808259), (-83.414427801, -126.359761378), (-81.063317121, -124.709631116))
            Line((-81.063317121, -124.709631116), (-17.547131117, -124.709631116))
            ThreePointArc((-17.547131117, -124.709631116), (-14.011597211, -126.17409721), (-12.547131117, -129.709631116))
        make_face()
    extrude(amount=-CUT_EXTRUDE4_DEPTH, mode=Mode.SUBTRACT)

    # Sketch5 → Cut-Extrude5 (cut, through all)
    with BuildSketch(Plane(origin=(137, 0, 0), x_dir=(0, 0, -1), z_dir=(1, 0, 0))):
        with BuildLine():
            Line((-210.3375, -146.999999998), (-210.3375, -167.499999998))
            ThreePointArc((-210.3375, -167.499999998), (-208.873033906, -171.035533904), (-205.3375, -172.499999998))
            Line((-205.3375, -172.499999998), (-183.830323645, -172.499999998))
            ThreePointArc((-183.830323645, -172.499999998), (-180.294789739, -171.035533904), (-178.830323645, -167.499999998))
            Line((-178.830323645, -167.499999998), (-178.830323645, -146.999999998))
            ThreePointArc((-178.830323645, -146.999999998), (-180.294789739, -143.464466093), (-183.830323645, -141.999999998))
            Line((-183.830323645, -141.999999998), (-205.3375, -141.999999998))
            ThreePointArc((-205.3375, -141.999999998), (-208.873033906, -143.464466093), (-210.3375, -146.999999998))
        make_face()
        with BuildLine():
            Line((-173.830323645, -146.999999998), (-173.830323645, -167.499999998))
            ThreePointArc((-173.830323645, -167.499999998), (-172.365857551, -171.035533904), (-168.830323645, -172.499999998))
            Line((-168.830323645, -172.499999998), (-147.323147289, -172.499999998))
            ThreePointArc((-147.323147289, -172.499999998), (-143.787613384, -171.035533904), (-142.323147289, -167.499999998))
            Line((-142.323147289, -167.499999998), (-142.323147289, -146.999999998))
            ThreePointArc((-142.323147289, -146.999999998), (-143.787613384, -143.464466093), (-147.323147289, -141.999999998))
            Line((-147.323147289, -141.999999998), (-168.830323645, -141.999999998))
            ThreePointArc((-168.830323645, -141.999999998), (-172.365857551, -143.464466093), (-173.830323645, -146.999999998))
        make_face()
        with BuildLine():
            Line((-137.323147289, -146.999999998), (-137.323147289, -167.499999998))
            ThreePointArc((-137.323147289, -167.499999998), (-135.858681195, -171.035533904), (-132.323147289, -172.499999998))
            Line((-132.323147289, -172.499999998), (-110.815970934, -172.499999998))
            ThreePointArc((-110.815970934, -172.499999998), (-107.280437028, -171.035533904), (-105.815970934, -167.499999998))
            Line((-105.815970934, -167.499999998), (-105.815970934, -146.999999998))
            ThreePointArc((-105.815970934, -146.999999998), (-107.280437028, -143.464466093), (-110.815970934, -141.999999998))
            Line((-110.815970934, -141.999999998), (-132.323147289, -141.999999998))
            ThreePointArc((-132.323147289, -141.999999998), (-135.858681195, -143.464466093), (-137.323147289, -146.999999998))
        make_face()
    extrude(amount=-CUT_EXTRUDE5_DEPTH, mode=Mode.SUBTRACT)

    # Fillet1
    fillet1_edges = [part.edges().sort_by_distance(p)[0] for p in [
        (129.5, -114.499999998, 220.3375),
        (129.5, -202.85226683, 220.3375),
    ]]
    fillet(fillet1_edges, radius=FILLET1_R)

    # Sketch7 → Cut-Extrude6 (cut)
    with BuildSketch(Plane(origin=(137, 0, 0), x_dir=(0, 0, -1), z_dir=(1, 0, 0))):
        with Locations((-110.3375, -67.676133415)):
            Rectangle(SKETCH7_W, SKETCH7_H)
    extrude(amount=-CUT_EXTRUDE6_DEPTH, mode=Mode.SUBTRACT)

    # Sketch8 → Cut-Extrude7 (cut, through all)
    with BuildSketch(Plane.XZ.offset(202.85226683)):
        Polygon((137, 54.353248627), (137, 242.443718096), (126, 242.443718096), (126, 38.3375), (137, 8.3375), align=None)
    extrude(amount=-CUT_EXTRUDE7_DEPTH, mode=Mode.SUBTRACT)

    # Fillet2
    fillet2_edges = [part.edges().sort_by_distance(p)[0] for p in [
        (131.5, 66, 0.3375),
        (131.5, -201.35226683, 0.3375),
    ]]
    fillet(fillet2_edges, radius=FILLET2_R)


solid = part.part
